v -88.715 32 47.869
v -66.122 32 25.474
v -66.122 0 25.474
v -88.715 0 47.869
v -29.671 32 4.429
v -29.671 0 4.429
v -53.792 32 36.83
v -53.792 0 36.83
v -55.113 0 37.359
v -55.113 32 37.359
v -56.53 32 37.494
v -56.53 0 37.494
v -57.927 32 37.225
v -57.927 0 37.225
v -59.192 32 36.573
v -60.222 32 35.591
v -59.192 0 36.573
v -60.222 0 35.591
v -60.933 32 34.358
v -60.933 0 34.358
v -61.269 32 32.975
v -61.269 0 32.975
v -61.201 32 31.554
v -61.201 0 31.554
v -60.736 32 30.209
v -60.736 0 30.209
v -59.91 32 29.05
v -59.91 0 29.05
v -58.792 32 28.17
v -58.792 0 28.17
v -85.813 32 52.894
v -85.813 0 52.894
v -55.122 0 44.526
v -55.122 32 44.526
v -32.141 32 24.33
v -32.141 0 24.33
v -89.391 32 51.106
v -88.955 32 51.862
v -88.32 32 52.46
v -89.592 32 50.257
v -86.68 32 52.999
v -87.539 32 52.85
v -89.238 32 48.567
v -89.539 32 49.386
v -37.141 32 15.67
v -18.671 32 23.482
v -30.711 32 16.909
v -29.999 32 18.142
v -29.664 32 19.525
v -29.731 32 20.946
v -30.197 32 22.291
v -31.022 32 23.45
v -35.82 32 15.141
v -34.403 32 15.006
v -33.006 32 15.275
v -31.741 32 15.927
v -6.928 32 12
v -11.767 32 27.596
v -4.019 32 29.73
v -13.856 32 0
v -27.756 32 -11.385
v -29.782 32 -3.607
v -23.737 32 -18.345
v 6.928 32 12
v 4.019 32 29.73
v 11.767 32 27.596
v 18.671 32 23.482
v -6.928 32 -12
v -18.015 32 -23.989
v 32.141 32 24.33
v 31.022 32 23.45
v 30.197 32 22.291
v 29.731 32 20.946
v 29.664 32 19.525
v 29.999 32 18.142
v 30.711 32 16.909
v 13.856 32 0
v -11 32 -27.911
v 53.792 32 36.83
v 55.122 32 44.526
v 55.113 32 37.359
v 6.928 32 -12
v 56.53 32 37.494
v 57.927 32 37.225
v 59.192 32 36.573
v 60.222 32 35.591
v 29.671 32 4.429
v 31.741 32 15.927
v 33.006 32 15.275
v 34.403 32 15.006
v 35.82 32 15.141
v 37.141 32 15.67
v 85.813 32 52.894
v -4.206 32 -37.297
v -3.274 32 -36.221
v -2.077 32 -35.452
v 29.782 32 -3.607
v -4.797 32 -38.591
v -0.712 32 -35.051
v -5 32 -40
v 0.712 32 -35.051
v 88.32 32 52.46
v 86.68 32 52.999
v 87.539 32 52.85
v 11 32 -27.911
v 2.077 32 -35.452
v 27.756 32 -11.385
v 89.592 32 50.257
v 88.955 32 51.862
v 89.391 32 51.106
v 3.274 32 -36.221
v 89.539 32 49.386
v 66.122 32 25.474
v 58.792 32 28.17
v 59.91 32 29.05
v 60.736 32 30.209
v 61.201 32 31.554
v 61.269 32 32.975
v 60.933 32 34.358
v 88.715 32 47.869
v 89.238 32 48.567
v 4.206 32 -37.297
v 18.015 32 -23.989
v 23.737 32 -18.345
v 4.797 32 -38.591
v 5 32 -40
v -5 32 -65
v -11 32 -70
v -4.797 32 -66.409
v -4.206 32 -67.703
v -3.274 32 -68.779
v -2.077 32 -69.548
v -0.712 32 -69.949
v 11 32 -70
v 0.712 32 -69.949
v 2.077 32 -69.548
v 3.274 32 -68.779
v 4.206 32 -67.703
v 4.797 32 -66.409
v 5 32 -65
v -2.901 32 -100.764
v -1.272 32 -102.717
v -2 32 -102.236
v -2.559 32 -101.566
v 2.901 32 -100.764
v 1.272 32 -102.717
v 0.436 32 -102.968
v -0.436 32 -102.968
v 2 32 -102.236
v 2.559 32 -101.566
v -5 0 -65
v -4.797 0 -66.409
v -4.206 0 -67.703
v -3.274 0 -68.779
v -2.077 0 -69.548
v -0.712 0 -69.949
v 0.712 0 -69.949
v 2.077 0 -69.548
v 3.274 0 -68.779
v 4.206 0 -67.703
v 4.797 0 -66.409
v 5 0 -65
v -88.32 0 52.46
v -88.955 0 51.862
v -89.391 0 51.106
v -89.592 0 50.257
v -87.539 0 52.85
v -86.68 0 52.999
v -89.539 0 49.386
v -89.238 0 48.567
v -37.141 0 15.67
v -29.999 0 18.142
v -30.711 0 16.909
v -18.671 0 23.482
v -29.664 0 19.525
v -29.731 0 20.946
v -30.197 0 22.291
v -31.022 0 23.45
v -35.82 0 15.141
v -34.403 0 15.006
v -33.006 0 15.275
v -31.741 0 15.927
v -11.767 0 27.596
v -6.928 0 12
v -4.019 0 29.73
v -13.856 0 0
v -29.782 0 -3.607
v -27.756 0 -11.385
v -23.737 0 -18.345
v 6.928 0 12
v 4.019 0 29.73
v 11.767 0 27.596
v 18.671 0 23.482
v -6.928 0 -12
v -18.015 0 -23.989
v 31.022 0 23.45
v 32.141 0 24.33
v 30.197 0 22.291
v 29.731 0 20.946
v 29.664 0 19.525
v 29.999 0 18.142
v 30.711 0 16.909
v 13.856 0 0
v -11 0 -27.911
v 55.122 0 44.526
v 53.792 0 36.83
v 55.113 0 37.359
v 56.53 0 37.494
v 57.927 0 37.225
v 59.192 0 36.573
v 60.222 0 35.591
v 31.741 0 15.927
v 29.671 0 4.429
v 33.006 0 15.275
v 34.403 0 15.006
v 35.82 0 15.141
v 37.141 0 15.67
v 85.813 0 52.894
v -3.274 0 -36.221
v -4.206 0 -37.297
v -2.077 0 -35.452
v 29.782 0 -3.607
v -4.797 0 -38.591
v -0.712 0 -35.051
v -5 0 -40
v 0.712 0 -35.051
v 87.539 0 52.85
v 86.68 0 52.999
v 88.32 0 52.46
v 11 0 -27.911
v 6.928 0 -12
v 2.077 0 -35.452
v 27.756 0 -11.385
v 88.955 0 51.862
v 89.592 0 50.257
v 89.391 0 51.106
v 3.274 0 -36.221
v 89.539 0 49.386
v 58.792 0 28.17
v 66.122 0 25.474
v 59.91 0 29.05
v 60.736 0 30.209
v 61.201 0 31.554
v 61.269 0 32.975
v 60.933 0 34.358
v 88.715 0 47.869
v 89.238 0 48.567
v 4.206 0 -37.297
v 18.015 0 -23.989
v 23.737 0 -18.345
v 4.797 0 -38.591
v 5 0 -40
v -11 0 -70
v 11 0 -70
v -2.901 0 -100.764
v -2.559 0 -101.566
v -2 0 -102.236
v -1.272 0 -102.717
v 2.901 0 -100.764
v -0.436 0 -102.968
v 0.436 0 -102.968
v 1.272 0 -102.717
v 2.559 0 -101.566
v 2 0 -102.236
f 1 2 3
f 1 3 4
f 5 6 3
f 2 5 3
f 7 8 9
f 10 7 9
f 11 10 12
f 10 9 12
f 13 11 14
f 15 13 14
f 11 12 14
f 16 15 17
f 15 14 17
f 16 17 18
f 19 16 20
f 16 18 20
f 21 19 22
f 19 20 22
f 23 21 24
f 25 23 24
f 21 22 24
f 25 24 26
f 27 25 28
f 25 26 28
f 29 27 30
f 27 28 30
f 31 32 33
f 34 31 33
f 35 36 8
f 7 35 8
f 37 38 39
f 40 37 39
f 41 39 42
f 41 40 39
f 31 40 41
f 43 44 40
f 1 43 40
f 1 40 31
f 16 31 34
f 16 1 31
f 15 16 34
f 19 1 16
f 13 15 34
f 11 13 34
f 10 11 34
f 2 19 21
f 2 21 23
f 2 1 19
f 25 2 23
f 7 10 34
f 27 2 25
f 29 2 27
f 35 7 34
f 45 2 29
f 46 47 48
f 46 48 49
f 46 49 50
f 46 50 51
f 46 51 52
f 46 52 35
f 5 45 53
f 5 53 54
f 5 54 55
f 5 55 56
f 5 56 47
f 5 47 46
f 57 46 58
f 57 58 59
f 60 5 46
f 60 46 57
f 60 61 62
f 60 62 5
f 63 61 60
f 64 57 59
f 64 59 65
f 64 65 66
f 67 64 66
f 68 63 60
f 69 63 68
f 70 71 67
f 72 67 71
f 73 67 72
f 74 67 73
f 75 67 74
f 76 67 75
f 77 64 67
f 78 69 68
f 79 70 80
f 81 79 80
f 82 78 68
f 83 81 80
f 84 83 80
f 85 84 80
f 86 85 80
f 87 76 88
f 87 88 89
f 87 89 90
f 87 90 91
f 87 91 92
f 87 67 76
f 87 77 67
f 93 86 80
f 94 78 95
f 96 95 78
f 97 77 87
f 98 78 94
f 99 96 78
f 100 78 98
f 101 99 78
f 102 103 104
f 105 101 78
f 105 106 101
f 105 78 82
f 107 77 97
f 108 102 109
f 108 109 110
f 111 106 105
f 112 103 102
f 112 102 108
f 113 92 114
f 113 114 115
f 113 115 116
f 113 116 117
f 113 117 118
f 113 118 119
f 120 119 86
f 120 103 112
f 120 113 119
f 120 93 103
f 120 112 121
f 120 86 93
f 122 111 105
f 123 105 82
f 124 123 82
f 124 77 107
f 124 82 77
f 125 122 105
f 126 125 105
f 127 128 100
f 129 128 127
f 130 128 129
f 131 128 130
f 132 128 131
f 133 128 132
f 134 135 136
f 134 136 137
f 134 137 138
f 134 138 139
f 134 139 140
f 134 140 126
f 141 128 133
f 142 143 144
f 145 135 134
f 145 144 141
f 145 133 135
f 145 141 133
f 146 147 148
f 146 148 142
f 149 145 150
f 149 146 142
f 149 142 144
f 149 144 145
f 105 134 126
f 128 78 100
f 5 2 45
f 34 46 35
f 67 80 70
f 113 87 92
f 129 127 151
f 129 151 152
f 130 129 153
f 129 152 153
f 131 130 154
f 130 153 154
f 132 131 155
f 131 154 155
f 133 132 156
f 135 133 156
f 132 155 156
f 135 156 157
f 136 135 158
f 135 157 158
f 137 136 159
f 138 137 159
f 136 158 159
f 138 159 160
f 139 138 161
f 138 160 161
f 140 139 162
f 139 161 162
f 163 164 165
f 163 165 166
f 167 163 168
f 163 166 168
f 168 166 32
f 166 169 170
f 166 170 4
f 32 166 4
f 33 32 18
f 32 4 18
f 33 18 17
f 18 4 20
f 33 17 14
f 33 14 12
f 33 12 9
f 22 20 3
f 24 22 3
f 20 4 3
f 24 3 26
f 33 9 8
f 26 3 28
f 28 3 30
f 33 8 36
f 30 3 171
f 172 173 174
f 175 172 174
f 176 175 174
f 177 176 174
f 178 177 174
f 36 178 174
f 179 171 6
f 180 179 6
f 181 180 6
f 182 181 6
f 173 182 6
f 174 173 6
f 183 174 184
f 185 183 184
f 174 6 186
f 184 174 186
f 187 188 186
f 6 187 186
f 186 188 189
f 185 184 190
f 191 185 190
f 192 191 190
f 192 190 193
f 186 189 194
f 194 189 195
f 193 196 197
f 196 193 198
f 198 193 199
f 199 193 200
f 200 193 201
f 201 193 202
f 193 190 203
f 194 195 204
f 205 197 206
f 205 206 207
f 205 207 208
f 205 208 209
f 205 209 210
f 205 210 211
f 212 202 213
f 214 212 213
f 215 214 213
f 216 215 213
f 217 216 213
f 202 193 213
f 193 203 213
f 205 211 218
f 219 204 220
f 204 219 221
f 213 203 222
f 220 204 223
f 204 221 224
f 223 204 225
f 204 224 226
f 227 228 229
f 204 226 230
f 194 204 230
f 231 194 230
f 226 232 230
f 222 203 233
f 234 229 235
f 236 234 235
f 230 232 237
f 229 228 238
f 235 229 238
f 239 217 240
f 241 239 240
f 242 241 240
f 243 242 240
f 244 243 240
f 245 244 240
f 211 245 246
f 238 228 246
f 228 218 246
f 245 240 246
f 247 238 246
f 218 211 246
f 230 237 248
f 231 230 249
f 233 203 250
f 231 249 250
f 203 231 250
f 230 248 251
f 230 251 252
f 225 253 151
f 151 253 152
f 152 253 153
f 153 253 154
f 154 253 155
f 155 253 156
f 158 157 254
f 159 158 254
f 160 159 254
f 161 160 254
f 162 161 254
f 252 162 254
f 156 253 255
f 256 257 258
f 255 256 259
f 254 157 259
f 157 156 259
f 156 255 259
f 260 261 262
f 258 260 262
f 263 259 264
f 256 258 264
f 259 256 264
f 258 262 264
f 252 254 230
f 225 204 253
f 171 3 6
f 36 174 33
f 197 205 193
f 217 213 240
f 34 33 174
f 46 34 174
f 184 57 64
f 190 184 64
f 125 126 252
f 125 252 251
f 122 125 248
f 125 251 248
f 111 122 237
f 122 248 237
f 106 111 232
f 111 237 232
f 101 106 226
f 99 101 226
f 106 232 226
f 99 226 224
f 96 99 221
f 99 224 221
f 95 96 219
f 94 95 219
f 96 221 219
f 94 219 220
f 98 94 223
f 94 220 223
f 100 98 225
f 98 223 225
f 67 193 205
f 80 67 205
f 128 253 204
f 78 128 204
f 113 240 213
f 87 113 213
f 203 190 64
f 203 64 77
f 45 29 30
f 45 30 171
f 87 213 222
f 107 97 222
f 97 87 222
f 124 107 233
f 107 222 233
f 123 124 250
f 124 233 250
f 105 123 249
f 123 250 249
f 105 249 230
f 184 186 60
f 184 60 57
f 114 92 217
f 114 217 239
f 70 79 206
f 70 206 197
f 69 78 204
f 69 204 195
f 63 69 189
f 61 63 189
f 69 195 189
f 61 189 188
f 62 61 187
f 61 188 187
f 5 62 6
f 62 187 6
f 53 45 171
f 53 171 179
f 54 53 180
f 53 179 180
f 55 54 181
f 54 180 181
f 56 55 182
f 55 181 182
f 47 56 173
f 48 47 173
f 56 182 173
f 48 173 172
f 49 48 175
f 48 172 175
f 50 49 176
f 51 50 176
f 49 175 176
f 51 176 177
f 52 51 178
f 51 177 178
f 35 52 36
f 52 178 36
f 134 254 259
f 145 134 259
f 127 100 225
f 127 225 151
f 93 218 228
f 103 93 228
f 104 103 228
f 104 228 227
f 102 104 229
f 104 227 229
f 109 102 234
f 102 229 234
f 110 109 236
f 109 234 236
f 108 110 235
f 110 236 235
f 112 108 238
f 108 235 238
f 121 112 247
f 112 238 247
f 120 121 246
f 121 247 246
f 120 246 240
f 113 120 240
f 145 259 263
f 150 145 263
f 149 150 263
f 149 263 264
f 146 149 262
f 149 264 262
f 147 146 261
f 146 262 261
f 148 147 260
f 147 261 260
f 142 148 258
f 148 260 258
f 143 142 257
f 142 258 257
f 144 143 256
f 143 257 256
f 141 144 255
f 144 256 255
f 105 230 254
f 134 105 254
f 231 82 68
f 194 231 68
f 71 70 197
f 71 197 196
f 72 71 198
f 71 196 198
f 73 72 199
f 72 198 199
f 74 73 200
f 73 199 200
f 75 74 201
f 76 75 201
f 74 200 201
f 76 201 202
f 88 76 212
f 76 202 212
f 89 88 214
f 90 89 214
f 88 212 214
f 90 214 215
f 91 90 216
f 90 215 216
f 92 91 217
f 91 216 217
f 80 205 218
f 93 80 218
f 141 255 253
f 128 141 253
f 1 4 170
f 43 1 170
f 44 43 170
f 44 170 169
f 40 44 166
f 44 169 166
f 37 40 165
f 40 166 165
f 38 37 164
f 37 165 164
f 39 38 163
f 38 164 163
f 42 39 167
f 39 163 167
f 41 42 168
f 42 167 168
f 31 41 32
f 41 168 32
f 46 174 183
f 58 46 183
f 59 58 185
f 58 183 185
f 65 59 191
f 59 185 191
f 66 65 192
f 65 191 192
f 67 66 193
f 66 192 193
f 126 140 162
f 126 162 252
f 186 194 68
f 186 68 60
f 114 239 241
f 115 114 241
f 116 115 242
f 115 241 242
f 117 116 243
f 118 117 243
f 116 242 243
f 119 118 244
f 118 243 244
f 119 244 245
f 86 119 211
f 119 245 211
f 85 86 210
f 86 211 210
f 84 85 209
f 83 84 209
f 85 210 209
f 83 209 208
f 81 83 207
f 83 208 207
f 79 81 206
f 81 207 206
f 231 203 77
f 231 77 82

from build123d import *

# Parameters (mm, degrees)
SKETCH1_R           = 30
BOSS_EXTRUDE1_DEPTH = 32


with BuildPart() as part:
    # Sketch1 → Boss-Extrude1 (new body)
    # profile 1 of 4: a face of its own
    with BuildSketch(Plane(origin=(0, 0, 0), x_dir=(1, 0, 0), z_dir=(0, 1, 0))):
        with BuildLine():
            Line((11, 27.910571474), (11, 70))
            Line((11, 70), (2.901151097, 100.763755402))
            ThreePointArc((2.901151097, 100.763755402), (0, 103), (-2.901151097, 100.763755402))
            Line((-2.901151097, 100.763755402), (-11, 70))
            Line((-11, 70), (-11, 27.910571474))
            ThreePointArc((-11, 27.910571474), (0, 30), (11, 27.910571474))
        make_face()
        with BuildLine():
            ThreePointArc((5, 40), (0, 35), (-5, 40))
            Line((-5, 40), (-5, 65))
            ThreePointArc((-5, 65), (0, 70), (5, 65))
            Line((5, 65), (5, 40))
        make_face(mode=Mode.SUBTRACT)
    # profile 2 of 4: a face of its own
    with BuildSketch(Plane(origin=(0, 0, 0), x_dir=(1, 0, 0), z_dir=(0, 1, 0))):
        Circle(SKETCH1_R)
        Polygon((6.92820323, -12), (13.856406461, 0), (6.92820323, 12), (-6.92820323, 12), (-13.856406461, 0), (-6.92820323, -12), align=None, mode=Mode.SUBTRACT)
    # profile 3 of 4: a face of its own
    with BuildSketch(Plane(origin=(0, 0, 0), x_dir=(1, 0, 0), z_dir=(0, 1, 0))):
        with BuildLine():
            Line((66.121778265, -25.473720558), (29.671263931, -4.429006295))
            ThreePointArc((29.671263931, -4.429006295), (25.980762114, -15), (18.671263931, -23.481565179))
            Line((18.671263931, -23.481565179), (55.121778265, -44.526279442))
            Line((55.121778265, -44.526279442), (85.813396411, -52.894348251))
            ThreePointArc((85.813396411, -52.894348251), (89.20061659, -51.5), (88.714547507, -47.869407151))
            Line((88.714547507, -47.869407151), (66.121778265, -25.473720558))
        make_face()
        with BuildLine():
            ThreePointArc((32.141016151, -24.330127019), (30.310889132, -17.5), (37.141016151, -15.669872981))
            Line((37.141016151, -15.669872981), (58.791651246, -28.169872981))
            ThreePointArc((58.791651246, -28.169872981), (60.621778265, -35), (53.791651246, -36.830127019))
            Line((53.791651246, -36.830127019), (32.141016151, -24.330127019))
        make_face(mode=Mode.SUBTRACT)
    # profile 4 of 4: a face of its own
    with BuildSketch(Plane(origin=(0, 0, 0), x_dir=(1, 0, 0), z_dir=(0, 1, 0))):
        with BuildLine():
            ThreePointArc((-18.671263931, -23.481565179), (-25.980762114, -15), (-29.671263931, -4.429006295))
            Line((-29.671263931, -4.429006295), (-66.121778265, -25.473720558))
            Line((-66.121778265, -25.473720558), (-88.714547507, -47.869407151))
            ThreePointArc((-88.714547507, -47.869407151), (-89.20061659, -51.5), (-85.813396411, -52.894348251))
            Line((-85.813396411, -52.894348251), (-55.121778265, -44.526279442))
            Line((-55.121778265, -44.526279442), (-18.671263931, -23.481565179))
        make_face()
        with BuildLine():
            ThreePointArc((-37.141016151, -15.669872981), (-30.310889132, -17.5), (-32.141016151, -24.330127019))
            Line((-32.141016151, -24.330127019), (-53.791651246, -36.830127019))
            ThreePointArc((-53.791651246, -36.830127019), (-60.621778265, -35), (-58.791651246, -28.169872981))
            Line((-58.791651246, -28.169872981), (-37.141016151, -15.669872981))
        make_face(mode=Mode.SUBTRACT)
    extrude(amount=BOSS_EXTRUDE1_DEPTH)


solid = part.part
